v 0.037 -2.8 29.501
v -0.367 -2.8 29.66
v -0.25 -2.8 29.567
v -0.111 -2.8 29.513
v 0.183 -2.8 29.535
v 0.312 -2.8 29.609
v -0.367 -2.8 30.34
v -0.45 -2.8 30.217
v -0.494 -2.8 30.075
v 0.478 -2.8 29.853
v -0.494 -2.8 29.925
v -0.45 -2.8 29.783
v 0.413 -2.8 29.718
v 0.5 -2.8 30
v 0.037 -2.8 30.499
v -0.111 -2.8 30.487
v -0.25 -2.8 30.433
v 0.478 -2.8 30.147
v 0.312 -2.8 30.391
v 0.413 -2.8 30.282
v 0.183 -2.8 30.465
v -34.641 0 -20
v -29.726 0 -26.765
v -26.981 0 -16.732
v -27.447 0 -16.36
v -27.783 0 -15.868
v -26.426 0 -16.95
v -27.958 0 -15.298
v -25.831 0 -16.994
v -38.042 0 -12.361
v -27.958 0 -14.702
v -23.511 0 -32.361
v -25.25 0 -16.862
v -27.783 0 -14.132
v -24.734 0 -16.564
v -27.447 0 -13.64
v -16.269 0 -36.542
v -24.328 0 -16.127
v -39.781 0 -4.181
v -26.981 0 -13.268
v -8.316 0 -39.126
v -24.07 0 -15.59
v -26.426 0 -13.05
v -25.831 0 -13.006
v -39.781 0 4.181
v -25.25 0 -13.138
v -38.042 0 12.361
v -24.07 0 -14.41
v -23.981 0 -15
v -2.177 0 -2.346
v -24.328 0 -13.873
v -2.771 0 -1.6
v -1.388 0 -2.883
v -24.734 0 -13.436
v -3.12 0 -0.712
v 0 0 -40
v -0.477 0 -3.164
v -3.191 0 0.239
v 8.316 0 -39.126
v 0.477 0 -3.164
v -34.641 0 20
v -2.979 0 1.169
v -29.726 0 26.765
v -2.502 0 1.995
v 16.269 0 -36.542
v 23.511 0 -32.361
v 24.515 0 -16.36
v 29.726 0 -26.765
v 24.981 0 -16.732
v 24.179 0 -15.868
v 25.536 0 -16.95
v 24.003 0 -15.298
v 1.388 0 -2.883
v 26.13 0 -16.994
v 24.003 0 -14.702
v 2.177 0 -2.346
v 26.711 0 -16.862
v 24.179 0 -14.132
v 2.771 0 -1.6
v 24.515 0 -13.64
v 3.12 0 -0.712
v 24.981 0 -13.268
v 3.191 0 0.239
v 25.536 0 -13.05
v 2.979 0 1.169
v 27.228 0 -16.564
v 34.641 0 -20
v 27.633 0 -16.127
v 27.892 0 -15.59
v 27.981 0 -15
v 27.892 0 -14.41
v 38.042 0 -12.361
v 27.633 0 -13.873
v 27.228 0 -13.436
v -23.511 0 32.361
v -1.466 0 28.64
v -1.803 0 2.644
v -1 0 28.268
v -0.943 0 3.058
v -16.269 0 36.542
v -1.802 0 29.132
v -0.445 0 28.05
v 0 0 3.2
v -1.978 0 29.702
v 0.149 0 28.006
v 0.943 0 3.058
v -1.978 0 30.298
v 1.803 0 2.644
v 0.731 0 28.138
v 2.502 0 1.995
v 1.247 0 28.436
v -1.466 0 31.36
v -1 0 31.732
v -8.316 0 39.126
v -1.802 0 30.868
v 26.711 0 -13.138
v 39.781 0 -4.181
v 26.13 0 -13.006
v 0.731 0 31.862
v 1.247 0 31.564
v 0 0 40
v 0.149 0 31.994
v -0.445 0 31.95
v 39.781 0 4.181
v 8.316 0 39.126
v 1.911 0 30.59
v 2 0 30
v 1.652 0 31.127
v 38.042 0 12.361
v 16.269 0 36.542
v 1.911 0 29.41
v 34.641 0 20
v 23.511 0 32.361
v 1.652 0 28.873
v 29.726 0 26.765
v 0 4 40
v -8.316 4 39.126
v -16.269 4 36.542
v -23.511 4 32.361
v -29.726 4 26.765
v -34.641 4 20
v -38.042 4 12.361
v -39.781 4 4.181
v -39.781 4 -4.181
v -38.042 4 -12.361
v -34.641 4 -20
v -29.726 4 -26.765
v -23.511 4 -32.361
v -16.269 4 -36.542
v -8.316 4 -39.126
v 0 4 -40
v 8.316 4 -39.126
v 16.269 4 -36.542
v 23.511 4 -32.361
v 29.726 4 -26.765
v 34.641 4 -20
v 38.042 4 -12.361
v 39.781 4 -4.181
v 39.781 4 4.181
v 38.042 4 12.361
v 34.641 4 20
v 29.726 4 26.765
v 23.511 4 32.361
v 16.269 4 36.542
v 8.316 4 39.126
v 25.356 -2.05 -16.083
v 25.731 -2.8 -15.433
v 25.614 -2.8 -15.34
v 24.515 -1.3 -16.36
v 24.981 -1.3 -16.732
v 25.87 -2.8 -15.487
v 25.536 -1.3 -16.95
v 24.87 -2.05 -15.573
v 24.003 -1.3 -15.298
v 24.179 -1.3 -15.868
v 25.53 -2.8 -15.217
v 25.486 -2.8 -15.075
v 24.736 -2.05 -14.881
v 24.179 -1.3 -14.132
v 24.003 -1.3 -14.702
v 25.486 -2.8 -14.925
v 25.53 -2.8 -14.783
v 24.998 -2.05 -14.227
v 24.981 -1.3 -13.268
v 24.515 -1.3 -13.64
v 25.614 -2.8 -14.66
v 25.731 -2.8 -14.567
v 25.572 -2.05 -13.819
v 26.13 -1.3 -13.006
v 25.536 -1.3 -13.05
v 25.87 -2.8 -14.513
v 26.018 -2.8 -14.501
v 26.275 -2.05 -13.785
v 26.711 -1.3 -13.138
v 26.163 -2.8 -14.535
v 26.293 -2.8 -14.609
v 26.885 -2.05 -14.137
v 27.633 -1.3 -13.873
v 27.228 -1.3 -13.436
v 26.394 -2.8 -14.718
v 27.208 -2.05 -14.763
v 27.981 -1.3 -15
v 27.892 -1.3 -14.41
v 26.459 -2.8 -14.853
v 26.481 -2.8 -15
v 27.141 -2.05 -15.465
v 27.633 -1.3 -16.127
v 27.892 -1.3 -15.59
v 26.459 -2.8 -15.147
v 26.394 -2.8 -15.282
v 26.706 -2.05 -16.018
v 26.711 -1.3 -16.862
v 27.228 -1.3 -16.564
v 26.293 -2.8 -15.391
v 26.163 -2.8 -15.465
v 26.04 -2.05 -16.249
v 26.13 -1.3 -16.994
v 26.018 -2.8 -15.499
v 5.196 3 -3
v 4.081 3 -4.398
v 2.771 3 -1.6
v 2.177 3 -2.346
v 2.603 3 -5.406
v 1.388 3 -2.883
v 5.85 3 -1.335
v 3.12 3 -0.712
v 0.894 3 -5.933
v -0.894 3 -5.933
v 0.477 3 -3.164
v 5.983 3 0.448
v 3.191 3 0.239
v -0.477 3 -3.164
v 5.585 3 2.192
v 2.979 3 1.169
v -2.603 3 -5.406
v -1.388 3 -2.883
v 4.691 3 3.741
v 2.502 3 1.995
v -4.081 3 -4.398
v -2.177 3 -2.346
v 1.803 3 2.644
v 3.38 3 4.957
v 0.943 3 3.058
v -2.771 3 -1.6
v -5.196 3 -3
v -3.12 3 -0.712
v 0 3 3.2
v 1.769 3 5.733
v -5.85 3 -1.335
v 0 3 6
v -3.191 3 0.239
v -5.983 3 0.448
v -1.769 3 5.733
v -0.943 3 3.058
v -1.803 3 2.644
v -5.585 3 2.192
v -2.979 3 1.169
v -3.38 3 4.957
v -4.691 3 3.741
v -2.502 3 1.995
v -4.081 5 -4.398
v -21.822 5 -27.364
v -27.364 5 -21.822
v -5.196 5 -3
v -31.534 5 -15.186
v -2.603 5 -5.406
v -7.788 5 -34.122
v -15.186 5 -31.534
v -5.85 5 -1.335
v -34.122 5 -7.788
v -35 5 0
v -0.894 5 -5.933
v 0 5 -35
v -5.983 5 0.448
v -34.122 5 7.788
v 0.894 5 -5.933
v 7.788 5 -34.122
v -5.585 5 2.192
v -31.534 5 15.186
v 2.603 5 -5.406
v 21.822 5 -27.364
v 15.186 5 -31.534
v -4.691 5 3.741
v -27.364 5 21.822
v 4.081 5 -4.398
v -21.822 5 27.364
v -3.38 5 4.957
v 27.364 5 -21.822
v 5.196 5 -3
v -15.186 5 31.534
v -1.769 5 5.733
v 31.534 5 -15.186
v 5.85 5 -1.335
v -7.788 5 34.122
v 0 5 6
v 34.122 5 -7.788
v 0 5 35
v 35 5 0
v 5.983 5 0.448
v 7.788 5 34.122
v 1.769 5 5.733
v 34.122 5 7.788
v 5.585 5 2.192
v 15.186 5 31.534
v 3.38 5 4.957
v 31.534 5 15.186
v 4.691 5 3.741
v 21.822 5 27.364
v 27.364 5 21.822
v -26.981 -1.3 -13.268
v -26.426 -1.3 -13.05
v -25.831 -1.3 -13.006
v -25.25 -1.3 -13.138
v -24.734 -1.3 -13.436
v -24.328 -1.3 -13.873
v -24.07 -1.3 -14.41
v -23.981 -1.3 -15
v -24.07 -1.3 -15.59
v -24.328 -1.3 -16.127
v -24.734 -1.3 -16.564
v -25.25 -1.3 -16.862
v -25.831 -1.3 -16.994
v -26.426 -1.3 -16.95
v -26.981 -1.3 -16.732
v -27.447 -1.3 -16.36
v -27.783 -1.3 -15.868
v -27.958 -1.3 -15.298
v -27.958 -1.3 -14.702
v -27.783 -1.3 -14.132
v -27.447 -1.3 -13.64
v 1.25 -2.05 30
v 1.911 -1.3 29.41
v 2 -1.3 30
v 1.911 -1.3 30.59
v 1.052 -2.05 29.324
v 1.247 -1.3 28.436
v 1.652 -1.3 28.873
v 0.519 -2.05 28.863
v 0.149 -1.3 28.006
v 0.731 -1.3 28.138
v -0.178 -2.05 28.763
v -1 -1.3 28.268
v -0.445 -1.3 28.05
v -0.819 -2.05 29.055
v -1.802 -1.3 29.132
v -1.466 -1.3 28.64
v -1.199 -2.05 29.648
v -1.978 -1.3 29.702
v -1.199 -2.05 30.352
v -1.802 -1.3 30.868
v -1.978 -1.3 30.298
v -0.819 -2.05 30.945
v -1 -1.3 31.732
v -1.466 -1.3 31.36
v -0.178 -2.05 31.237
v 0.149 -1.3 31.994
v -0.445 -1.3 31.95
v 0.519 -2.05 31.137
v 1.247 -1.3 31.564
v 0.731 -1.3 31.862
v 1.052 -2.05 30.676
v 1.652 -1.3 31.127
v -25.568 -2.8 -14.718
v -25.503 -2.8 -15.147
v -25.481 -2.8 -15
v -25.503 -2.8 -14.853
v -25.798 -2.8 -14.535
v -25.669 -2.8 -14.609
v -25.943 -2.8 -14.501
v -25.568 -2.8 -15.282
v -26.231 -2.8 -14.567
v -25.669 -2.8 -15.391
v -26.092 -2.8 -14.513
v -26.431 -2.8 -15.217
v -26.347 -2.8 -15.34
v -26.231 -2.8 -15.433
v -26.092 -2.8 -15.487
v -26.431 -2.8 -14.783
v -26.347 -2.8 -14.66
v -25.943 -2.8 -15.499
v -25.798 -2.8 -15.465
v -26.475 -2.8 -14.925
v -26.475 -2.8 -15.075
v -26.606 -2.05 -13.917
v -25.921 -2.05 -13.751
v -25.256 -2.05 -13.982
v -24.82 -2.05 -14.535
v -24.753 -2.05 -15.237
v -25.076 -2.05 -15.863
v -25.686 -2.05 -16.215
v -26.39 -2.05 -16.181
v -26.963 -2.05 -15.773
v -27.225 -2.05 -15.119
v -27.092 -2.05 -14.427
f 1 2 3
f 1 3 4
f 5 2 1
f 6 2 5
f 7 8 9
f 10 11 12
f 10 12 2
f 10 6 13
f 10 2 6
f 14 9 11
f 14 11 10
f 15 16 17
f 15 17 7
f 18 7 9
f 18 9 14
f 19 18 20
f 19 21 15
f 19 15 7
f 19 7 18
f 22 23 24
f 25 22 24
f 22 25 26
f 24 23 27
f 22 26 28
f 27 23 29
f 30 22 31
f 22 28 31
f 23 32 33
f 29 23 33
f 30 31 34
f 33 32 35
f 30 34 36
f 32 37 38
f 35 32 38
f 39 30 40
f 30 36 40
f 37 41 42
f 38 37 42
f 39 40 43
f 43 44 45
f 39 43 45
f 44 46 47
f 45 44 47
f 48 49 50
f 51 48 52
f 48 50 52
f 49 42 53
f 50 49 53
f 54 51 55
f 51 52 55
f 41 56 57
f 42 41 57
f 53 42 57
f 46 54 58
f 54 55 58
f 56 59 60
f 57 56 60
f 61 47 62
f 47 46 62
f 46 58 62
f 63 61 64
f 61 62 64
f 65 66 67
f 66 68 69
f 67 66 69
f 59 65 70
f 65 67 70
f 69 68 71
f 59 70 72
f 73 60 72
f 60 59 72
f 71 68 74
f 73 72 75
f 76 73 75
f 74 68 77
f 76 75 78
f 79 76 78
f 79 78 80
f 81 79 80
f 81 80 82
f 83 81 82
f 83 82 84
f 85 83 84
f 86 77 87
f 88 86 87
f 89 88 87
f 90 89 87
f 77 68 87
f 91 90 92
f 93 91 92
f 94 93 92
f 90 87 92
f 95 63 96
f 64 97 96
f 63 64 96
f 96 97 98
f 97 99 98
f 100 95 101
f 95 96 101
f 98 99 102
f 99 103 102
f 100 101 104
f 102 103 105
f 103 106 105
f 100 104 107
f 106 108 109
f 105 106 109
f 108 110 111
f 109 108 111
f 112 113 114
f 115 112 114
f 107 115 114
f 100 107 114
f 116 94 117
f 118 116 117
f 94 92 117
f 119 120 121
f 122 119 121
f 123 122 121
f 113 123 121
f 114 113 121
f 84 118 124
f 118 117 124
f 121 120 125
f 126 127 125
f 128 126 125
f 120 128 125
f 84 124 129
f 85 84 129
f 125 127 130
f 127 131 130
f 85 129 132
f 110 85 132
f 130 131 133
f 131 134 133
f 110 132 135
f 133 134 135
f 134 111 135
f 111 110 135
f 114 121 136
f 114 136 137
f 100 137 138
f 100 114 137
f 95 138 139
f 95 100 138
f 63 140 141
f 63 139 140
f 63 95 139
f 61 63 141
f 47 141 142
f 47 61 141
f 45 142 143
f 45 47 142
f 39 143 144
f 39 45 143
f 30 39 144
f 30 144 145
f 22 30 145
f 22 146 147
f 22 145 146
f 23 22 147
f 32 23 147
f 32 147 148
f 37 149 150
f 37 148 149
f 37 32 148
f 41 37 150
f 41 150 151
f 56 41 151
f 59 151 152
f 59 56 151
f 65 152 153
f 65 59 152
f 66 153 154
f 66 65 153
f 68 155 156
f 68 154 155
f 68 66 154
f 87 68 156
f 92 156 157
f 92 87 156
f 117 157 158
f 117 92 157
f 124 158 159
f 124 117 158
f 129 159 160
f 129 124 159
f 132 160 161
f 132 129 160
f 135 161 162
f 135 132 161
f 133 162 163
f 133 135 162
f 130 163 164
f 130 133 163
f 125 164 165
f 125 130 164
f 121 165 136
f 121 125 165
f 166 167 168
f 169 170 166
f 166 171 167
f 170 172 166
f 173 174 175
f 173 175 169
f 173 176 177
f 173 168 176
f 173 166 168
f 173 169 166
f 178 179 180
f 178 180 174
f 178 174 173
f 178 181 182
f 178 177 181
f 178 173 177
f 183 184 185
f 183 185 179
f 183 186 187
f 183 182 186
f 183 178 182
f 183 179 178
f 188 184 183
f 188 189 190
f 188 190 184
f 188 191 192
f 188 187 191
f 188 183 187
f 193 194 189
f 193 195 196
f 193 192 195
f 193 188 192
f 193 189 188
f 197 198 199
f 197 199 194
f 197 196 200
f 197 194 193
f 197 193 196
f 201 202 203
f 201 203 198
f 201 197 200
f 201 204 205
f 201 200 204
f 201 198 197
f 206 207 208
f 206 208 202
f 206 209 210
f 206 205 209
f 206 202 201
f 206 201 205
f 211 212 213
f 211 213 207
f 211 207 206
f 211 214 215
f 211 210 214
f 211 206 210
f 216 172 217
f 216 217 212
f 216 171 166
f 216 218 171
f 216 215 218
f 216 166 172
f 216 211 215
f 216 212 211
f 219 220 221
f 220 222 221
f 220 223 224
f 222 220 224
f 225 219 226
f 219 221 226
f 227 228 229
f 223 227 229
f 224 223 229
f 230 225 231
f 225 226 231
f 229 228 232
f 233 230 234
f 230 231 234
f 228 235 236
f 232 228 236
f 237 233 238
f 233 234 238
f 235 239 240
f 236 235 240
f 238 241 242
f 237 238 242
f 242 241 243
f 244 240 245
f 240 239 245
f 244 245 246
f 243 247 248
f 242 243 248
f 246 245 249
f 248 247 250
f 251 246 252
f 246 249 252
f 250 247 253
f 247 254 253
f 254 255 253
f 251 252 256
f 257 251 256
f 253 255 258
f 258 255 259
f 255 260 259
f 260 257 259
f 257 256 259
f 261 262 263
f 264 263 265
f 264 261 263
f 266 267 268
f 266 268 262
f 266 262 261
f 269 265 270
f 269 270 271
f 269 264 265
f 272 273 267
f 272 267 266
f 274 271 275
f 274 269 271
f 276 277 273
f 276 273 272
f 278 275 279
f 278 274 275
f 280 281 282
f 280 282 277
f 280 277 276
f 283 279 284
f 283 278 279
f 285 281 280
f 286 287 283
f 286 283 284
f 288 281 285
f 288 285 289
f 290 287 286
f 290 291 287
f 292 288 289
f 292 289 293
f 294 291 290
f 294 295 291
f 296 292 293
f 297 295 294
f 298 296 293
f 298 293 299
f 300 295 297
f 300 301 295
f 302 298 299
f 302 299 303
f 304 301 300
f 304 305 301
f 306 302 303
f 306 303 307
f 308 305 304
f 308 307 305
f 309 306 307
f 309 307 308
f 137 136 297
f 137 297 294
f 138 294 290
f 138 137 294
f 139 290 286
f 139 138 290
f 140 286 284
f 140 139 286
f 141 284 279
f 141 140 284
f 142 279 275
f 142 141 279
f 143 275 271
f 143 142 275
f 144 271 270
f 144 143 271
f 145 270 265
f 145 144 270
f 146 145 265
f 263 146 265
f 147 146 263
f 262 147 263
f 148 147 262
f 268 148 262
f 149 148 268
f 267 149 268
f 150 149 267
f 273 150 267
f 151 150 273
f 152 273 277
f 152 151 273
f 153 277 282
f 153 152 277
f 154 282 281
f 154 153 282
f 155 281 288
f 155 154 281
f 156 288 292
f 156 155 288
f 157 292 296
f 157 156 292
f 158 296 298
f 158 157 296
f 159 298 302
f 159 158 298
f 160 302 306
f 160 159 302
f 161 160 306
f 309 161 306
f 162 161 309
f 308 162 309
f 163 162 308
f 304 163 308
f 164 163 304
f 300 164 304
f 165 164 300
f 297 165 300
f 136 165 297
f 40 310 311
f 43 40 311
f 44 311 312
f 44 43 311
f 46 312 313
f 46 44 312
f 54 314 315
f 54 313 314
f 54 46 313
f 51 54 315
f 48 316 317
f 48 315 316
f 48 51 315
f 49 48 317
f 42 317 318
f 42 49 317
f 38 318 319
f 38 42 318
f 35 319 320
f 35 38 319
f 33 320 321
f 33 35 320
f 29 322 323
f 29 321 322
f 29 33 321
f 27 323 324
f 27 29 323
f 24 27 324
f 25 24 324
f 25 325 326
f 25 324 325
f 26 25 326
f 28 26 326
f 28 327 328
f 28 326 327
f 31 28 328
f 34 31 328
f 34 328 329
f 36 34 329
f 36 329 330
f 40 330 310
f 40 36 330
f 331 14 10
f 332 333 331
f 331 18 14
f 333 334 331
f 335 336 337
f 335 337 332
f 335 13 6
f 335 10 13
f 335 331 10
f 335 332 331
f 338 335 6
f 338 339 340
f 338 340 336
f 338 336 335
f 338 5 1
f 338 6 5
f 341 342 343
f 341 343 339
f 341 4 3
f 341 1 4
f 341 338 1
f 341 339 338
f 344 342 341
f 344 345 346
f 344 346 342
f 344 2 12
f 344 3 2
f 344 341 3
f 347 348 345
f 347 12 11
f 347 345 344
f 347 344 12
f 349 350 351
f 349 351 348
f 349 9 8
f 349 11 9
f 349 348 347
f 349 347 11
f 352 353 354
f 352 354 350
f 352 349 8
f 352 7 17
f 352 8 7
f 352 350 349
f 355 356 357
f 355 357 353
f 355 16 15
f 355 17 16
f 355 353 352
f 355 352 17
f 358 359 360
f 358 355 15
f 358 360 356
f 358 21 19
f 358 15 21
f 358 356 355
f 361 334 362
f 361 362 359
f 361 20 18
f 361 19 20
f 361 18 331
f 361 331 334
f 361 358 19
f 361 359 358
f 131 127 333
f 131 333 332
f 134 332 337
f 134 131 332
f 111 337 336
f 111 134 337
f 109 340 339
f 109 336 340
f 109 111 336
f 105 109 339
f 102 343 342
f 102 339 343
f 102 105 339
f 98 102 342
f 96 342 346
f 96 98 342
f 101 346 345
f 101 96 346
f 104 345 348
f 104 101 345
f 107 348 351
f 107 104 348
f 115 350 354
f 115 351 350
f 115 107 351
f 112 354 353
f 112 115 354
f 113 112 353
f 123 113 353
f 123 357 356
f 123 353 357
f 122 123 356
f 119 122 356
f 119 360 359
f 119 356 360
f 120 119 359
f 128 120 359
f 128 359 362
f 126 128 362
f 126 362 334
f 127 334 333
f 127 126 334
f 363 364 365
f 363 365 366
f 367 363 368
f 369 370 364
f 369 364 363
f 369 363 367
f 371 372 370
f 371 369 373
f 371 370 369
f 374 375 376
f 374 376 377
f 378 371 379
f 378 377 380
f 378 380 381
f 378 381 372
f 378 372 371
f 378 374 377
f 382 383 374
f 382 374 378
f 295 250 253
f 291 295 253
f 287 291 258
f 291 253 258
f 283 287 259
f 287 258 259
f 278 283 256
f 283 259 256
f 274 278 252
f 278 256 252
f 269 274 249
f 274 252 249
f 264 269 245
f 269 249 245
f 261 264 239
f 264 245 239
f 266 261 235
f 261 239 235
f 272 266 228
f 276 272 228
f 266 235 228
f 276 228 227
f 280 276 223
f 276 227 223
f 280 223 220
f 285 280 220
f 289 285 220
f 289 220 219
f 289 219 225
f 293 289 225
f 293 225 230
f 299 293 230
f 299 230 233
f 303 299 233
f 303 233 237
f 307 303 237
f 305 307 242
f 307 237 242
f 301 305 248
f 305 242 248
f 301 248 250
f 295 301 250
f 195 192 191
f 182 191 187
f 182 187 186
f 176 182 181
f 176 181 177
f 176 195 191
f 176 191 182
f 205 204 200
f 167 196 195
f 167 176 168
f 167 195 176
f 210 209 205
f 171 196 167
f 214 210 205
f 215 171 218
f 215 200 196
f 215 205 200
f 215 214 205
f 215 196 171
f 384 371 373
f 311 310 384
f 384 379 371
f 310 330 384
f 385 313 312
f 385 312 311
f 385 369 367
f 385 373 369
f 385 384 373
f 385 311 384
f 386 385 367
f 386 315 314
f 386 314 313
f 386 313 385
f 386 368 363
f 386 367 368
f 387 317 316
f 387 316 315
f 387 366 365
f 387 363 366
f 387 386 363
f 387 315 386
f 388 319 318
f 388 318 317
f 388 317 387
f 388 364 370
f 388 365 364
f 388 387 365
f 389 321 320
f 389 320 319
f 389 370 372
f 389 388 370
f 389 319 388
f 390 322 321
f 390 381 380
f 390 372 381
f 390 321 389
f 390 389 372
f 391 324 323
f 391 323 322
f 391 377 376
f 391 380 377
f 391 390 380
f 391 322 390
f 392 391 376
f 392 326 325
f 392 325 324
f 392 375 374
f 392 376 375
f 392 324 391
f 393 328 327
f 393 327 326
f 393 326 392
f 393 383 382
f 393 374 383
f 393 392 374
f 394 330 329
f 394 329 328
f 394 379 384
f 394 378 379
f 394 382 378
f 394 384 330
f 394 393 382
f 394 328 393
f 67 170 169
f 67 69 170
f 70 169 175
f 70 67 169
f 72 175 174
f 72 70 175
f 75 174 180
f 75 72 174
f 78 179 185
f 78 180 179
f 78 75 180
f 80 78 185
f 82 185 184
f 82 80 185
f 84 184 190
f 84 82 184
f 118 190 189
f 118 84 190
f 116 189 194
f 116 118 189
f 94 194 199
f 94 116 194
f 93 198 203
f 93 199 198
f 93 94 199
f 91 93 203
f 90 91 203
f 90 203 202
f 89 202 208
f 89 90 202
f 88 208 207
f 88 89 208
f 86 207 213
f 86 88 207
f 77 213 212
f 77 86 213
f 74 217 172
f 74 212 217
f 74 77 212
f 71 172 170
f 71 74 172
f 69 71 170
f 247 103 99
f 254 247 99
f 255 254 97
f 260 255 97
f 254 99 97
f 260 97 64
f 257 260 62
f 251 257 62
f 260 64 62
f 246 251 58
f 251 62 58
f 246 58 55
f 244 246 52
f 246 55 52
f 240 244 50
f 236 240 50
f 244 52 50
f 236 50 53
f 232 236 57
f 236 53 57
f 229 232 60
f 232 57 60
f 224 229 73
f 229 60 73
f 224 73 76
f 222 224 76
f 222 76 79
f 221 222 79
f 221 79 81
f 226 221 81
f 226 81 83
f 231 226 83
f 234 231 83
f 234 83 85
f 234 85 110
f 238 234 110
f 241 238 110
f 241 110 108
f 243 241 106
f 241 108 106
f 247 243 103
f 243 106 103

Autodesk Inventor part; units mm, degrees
ref_plane "YZ Plane" through (0, 0, 0) normal (1, 0, 0) x (0, 1, 0)
ref_plane "XZ Plane" through (0, 0, 0) normal (0, 1, 0) x (-1, 0, 0)
ref_plane "XY Plane" through (0, 0, 0) normal (0, 0, 1) x (1, 0, 0)
sketch "Esquisse3" plane through (0, 0, 0) normal (1, 0, 0) x (0, 1, 0)
  line L0 (-7.2956, 0) -> (7.2956, 0)
  line L1 (5, 0) -> (5, 35)
  line L2 (5, 35) -> (4, 40)
  line L3 (4, 40) -> (0, 40)
  line L4 (0, 40) -> (0, 0)
  line L5 (0, 0) -> (5, 0)
  dimension "d1" = 5
  dimension "d2" = 4
  dimension "d3" = 5
  dimension "d4" = 80
revolve "Révolution1" add sketch "Esquisse3" angle 360 about axis through (0, -7.2956, 0) along (0, 1, 0)
sketch "Esquisse4" plane through (0, 5, 0) normal (0, 1, 0) x (1, 0, 0)
  point P0 (0, 0)
  point P1 (0, 0)
hole "Perçage1" at (0, 5, 0) direction (0, -1, 0) diameter 6.4 end through all counterbore diameter 12 counterbore depth 2
sketch "Esquisse5" plane through (0, 0, 0) normal (0, -1, 0) x (1, 0, 0)
  circle A0 centre (0, 30) radius 2
  point P0 (0, 0)
  dimension "d13" = 4
  dimension "d14" = 30
extrude "Extrusion1" add sketch "Esquisse5" along normal blind 2.8
chamfer "Chanfrein1" distance 1.5 angle 45 1 edges at (-2, -2.8, 30)
pattern_circular "Réseau circulaire1" count 3 over 360 about axis through (0, -10, 0) along (0, 1, 0) of "Extrusion1", "Chanfrein1"
properties part number "support_serrage_tourelle"
